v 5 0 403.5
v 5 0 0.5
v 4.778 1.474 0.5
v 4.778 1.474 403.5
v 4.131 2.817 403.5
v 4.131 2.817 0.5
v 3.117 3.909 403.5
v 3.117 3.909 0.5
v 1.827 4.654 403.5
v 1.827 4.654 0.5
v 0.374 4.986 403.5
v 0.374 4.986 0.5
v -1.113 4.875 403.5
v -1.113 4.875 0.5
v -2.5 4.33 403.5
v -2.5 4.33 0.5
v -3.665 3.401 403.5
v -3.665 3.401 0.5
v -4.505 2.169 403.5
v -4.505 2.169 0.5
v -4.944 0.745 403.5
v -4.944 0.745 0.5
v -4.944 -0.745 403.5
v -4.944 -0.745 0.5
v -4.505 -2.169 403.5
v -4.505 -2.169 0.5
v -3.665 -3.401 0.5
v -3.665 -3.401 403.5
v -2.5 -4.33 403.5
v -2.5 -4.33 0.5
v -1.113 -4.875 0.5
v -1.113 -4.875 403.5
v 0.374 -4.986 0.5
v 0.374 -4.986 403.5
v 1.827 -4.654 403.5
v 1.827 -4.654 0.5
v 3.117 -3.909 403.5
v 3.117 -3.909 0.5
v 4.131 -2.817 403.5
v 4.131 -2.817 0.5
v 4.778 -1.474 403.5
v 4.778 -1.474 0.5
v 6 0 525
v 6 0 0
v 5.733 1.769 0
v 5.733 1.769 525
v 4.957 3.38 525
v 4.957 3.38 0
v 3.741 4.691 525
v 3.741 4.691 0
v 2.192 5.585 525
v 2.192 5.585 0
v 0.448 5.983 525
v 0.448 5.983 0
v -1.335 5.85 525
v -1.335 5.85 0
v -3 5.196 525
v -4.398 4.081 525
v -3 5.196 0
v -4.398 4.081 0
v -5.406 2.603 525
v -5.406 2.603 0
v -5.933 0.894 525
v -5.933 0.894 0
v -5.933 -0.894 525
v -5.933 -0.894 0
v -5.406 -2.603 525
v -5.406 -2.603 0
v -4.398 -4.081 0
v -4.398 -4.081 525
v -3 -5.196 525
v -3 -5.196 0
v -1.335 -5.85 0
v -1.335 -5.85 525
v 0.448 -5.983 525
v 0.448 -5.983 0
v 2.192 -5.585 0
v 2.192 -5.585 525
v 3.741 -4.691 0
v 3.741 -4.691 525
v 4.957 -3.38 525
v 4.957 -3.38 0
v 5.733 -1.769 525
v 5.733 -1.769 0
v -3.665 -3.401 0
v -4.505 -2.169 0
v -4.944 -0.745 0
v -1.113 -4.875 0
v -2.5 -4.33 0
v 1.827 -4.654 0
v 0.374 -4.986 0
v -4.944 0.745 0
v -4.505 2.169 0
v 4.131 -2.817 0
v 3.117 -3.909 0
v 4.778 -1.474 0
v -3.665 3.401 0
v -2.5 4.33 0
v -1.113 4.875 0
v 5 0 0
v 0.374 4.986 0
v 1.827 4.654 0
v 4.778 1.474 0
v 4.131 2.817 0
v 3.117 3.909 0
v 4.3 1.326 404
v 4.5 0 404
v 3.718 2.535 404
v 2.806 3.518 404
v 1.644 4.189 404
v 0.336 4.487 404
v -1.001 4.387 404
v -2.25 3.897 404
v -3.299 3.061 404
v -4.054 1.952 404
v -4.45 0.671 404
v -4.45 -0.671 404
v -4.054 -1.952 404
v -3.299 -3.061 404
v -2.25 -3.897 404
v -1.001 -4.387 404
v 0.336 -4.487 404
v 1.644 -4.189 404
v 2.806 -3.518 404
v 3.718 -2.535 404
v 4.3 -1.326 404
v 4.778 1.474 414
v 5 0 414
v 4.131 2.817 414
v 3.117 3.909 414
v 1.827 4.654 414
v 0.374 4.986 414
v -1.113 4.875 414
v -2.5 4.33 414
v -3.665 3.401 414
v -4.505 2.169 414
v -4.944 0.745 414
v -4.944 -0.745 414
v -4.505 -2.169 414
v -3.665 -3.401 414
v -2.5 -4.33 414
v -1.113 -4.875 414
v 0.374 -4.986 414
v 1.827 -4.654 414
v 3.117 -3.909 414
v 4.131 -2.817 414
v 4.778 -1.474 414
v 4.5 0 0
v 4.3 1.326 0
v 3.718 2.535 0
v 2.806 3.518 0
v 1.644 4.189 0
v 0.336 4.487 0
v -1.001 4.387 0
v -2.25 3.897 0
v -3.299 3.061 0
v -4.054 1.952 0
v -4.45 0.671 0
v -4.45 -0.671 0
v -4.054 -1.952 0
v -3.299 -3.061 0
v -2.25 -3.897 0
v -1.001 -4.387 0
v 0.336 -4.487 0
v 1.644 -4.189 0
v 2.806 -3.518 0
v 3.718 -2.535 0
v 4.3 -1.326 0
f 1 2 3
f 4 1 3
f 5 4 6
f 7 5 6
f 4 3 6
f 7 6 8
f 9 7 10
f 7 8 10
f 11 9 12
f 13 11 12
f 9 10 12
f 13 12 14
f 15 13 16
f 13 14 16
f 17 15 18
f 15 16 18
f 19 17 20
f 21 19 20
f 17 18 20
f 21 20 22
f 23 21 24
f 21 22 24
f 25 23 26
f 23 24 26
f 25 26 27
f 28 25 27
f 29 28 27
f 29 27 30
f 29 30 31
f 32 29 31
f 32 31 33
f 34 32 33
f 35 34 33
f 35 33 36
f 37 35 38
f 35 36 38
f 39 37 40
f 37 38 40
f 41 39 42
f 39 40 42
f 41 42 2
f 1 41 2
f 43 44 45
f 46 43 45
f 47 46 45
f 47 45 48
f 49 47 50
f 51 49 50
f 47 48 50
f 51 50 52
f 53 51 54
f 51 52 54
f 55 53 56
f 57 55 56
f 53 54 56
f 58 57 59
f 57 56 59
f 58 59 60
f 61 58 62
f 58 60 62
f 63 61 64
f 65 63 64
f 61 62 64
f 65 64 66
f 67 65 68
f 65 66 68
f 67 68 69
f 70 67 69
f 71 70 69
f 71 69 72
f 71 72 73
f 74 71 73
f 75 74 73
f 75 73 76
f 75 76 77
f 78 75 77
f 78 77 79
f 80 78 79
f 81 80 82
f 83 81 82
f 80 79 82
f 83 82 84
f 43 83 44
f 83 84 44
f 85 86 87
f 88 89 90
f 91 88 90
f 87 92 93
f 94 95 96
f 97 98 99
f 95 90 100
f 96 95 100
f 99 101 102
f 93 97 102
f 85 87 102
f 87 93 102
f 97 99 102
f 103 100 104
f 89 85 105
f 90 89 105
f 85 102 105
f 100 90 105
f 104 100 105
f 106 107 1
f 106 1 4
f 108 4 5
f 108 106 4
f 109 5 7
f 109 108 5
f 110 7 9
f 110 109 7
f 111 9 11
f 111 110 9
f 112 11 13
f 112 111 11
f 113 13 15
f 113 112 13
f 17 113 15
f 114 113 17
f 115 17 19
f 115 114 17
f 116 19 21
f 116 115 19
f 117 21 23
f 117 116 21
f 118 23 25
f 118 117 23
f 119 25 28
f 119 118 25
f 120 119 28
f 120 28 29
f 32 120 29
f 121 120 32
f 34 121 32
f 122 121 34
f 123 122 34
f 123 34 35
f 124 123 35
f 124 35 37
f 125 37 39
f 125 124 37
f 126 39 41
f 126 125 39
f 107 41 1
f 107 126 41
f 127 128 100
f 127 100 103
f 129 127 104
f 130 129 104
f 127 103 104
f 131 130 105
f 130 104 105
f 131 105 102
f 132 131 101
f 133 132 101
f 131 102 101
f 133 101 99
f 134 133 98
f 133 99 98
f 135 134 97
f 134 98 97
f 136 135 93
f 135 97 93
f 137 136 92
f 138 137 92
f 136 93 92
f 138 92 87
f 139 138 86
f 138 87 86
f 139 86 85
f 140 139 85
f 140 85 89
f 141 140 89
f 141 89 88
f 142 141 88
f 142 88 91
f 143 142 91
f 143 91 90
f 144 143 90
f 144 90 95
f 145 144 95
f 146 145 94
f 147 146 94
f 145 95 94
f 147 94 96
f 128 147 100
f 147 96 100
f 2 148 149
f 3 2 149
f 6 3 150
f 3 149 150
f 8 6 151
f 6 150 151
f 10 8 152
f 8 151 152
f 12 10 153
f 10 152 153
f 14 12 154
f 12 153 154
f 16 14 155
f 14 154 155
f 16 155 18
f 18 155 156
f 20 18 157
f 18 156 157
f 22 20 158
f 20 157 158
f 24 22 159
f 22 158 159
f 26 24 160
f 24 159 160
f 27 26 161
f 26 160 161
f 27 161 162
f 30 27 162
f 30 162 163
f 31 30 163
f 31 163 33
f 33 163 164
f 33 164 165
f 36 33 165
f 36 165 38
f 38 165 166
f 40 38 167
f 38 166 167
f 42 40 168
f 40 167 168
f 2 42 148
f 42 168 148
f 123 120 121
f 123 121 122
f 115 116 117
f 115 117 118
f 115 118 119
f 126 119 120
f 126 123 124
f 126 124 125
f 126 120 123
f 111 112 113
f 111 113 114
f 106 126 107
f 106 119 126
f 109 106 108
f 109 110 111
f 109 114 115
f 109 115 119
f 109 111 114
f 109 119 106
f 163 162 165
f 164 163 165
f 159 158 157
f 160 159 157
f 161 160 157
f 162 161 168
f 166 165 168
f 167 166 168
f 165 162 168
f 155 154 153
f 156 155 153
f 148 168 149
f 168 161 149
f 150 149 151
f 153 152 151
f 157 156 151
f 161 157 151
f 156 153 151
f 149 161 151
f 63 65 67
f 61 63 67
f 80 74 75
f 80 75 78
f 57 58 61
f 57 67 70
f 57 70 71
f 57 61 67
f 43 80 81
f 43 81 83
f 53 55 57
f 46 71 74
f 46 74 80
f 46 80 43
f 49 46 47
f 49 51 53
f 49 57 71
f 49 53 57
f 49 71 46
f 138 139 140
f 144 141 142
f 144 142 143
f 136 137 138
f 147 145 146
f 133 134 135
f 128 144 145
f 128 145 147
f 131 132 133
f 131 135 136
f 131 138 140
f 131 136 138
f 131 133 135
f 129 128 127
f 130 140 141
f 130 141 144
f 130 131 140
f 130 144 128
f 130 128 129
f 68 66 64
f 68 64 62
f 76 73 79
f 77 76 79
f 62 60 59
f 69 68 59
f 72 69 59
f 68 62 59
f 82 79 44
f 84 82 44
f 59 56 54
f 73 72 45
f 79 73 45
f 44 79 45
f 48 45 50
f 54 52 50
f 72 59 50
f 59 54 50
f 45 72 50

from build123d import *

# Parameters (mm, degrees)
F0_R     = 6
F0_R_2   = 5
F1_DEPTH = 525
F2_DEPTH = 404
F3_SIZE  = 0.5
F4_DEPTH = 414


with BuildPart() as f1:
    # F0 (on Top) → F1 (new body)
    with BuildSketch(Plane.XY):
        Circle(F0_R)
        Circle(F0_R_2, mode=Mode.SUBTRACT)
        Circle(F0_R_2)
    extrude(amount=F1_DEPTH)


with BuildPart() as f2:
    # F0 (on Top) → F2 (new body)
    with BuildSketch(Plane.XY):
        Circle(F0_R_2)
    extrude(amount=F2_DEPTH)

    # F3
    f3_edges = [f2.edges().sort_by_distance(p)[0] for p in [
        (-5, 0, 0),
        (-5, 0, 404),
    ]]
    chamfer(f3_edges, length=F3_SIZE)


with BuildPart() as f4:
    # F0 (on Top) → F4 (new body)
    with BuildSketch(Plane.XY):
        Circle(F0_R_2)
    extrude(amount=F4_DEPTH)


solid = Compound([f1.part, f2.part, f4.part])
